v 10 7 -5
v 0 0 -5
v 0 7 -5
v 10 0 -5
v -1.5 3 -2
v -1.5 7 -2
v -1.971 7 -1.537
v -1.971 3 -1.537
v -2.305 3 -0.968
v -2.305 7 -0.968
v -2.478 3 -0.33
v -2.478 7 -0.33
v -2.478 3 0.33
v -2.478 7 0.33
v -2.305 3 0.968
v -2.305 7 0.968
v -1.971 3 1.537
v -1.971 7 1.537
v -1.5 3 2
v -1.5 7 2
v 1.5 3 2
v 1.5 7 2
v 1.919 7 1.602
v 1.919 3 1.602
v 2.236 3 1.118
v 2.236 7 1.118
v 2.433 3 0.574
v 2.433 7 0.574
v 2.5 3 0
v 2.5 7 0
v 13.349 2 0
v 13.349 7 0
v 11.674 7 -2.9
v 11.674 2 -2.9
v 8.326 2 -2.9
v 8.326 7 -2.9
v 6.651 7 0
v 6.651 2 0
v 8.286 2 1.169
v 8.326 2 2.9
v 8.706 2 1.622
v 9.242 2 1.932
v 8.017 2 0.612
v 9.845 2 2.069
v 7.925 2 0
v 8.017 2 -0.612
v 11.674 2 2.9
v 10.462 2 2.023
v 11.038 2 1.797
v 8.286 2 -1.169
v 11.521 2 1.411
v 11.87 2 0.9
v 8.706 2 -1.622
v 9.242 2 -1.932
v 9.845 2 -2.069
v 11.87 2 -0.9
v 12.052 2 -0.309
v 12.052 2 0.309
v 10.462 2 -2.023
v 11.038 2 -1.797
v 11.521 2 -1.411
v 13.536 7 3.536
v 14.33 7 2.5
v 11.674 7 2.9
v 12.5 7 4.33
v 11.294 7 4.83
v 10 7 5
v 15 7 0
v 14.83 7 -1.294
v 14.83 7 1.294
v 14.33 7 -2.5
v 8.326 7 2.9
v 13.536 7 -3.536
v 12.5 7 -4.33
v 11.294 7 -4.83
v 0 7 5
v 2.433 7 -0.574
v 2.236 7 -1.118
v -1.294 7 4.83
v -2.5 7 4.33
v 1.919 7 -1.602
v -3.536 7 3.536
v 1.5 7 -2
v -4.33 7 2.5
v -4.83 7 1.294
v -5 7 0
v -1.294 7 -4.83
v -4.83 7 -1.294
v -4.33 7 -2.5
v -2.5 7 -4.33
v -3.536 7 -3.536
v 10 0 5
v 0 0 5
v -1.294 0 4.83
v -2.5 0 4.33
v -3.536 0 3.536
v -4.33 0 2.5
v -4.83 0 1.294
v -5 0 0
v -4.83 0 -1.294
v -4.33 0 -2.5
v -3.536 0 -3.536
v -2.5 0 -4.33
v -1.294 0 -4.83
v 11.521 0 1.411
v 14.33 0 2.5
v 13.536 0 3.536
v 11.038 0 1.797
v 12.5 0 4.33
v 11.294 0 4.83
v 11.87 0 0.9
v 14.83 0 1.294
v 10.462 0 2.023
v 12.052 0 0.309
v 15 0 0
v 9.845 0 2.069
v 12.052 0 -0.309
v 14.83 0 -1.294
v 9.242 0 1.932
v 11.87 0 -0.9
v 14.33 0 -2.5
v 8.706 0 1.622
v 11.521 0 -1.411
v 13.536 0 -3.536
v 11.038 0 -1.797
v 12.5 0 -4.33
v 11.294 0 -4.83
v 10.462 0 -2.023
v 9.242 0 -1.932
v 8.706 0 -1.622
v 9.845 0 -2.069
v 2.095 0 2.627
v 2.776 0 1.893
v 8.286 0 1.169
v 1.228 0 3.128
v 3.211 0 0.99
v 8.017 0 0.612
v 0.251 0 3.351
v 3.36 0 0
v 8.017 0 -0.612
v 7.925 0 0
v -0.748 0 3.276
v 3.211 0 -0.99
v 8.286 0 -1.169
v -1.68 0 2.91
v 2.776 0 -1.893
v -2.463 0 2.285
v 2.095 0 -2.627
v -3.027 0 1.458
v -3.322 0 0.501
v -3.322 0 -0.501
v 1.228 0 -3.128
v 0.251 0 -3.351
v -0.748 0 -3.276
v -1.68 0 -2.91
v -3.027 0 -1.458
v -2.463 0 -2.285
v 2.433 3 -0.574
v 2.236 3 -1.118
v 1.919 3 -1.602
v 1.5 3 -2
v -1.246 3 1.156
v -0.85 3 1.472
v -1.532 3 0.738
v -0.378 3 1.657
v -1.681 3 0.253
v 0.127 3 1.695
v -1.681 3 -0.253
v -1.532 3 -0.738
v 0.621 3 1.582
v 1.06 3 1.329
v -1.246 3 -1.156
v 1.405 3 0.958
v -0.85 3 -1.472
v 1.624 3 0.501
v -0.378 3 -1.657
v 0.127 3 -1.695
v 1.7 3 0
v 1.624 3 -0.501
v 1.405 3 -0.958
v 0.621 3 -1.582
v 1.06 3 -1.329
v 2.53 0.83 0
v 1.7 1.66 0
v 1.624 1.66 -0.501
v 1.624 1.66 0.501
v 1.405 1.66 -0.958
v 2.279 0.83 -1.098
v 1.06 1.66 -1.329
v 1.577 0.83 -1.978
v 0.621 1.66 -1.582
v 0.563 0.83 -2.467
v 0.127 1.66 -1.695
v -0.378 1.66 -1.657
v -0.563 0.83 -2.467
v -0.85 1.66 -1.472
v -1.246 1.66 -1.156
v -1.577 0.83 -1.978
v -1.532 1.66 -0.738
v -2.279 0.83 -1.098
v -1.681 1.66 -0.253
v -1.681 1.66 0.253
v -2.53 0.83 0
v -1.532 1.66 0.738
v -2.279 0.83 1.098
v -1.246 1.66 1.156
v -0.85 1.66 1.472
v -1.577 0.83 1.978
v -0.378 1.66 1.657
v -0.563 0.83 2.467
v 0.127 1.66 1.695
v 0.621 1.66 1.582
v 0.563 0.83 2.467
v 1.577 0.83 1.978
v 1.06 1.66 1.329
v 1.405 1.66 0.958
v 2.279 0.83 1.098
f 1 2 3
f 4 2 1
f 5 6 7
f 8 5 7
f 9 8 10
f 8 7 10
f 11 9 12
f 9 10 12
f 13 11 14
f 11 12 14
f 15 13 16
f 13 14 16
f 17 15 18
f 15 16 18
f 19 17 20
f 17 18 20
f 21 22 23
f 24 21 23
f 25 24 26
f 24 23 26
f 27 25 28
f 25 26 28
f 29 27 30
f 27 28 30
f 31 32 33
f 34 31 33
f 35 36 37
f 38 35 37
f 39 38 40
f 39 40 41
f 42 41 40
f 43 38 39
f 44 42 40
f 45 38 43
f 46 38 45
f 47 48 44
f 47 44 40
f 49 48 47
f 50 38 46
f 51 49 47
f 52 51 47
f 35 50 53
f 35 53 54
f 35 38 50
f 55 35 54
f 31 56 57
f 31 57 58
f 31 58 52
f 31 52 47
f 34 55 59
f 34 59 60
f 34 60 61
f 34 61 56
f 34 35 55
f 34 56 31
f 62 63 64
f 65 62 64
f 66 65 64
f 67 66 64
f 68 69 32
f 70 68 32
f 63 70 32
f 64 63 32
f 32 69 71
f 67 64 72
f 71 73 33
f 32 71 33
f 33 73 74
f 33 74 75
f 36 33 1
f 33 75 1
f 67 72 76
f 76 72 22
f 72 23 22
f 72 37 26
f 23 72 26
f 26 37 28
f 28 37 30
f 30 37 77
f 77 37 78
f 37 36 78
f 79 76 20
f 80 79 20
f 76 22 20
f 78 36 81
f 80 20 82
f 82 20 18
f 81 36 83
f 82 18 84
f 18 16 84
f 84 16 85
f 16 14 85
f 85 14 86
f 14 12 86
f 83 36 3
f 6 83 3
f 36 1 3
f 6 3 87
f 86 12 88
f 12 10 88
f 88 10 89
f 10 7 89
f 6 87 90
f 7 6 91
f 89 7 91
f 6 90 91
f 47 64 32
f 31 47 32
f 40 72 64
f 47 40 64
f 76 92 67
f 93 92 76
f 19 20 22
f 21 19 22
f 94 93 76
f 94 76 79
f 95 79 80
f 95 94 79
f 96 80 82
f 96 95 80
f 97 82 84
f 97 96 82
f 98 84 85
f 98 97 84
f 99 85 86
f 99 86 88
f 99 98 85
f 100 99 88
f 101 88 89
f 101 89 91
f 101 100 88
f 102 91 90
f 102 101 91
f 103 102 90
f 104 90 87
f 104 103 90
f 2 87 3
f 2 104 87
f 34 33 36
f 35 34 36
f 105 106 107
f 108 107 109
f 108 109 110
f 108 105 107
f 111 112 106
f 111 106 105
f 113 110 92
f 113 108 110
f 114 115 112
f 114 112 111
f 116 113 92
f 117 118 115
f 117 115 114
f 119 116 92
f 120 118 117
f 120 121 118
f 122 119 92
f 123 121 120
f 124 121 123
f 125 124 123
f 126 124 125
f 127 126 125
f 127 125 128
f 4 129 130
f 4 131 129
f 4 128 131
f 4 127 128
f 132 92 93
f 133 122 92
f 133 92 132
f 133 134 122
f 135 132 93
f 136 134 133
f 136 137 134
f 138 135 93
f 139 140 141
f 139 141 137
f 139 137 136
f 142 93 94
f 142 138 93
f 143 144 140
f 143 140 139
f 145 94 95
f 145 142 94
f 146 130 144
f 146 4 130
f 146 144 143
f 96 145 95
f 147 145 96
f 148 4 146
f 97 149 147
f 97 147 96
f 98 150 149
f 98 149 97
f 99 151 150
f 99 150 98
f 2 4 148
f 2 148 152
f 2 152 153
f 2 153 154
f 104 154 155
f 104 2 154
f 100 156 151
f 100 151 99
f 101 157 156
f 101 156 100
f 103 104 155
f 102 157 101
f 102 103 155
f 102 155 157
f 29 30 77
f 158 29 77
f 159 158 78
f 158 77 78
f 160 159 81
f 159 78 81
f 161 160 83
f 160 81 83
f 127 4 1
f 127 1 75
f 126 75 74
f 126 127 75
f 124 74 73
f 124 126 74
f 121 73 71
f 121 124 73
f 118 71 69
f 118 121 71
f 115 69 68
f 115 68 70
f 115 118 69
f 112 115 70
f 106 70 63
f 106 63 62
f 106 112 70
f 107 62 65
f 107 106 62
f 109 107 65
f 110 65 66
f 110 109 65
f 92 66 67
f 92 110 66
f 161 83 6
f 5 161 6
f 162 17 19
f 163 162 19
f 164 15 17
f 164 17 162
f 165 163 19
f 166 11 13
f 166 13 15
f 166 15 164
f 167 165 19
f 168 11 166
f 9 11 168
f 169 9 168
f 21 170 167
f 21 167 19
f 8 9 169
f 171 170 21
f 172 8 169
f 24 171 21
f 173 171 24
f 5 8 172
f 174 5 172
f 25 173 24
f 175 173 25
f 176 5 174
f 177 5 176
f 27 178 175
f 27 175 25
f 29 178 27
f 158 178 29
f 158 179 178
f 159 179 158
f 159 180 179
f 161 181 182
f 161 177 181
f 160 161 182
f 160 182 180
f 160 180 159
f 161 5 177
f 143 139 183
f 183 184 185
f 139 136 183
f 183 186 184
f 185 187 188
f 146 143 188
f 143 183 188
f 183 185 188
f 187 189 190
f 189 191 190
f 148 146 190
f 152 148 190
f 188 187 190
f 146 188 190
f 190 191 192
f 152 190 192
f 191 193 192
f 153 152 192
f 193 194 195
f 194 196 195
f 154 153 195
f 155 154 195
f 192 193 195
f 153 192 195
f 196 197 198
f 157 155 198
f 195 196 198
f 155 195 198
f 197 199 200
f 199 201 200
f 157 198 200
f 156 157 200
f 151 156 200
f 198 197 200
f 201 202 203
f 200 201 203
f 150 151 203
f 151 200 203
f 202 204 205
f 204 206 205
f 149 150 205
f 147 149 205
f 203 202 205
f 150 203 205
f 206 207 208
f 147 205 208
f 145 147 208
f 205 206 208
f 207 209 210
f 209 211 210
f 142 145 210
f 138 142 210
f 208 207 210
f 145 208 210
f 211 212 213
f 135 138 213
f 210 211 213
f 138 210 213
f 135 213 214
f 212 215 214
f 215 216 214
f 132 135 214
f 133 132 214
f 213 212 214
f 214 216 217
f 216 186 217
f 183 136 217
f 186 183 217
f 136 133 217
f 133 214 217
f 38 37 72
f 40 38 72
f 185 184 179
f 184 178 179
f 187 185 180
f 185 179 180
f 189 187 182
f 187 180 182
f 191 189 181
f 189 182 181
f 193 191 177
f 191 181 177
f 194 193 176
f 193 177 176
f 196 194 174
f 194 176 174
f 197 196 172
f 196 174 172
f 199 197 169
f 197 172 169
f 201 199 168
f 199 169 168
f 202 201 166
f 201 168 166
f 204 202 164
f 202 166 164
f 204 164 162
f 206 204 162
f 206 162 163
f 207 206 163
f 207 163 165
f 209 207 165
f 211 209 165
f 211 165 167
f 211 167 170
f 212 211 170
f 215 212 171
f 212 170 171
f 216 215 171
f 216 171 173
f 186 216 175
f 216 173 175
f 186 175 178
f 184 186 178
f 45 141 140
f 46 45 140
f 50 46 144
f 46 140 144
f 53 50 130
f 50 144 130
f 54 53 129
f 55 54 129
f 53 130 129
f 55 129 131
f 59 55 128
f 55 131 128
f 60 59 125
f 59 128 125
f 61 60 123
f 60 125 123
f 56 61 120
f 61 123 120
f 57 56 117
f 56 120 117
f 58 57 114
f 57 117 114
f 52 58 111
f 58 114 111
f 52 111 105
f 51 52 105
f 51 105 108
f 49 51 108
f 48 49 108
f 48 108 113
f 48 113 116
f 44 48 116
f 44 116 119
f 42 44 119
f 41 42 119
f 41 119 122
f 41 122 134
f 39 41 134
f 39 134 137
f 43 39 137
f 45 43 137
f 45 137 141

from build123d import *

# Parameters (mm, degrees)
EXTRUDE_2_DEPTH              = 7
CUT_EXTRUDE_1_DEPTH          = 4
HOLE_WIZARD_M3_1_D           = 3.4
HOLE_WIZARD_M3_1_CSINK_D     = 6.72
HOLE_WIZARD_M3_1_CSINK_ANGLE = 90
HOLE_WIZARD_1_D              = 4.15
HOLE_WIZARD_1_DEPTH          = 10
CUT_EXTRUDE_2_DEPTH          = 5


with BuildPart() as part:
    # 草图1 → 凸台-拉伸2 (new body)
    with BuildSketch(Plane(origin=(0, 0, 0), x_dir=(1, 0, 0), z_dir=(0, 1, 0))):
        with BuildLine():
            Line((0, 5), (10, 5))
            ThreePointArc((10, 5), (15, 0), (10, -5))
            Line((10, -5), (0, -5))
            ThreePointArc((0, -5), (-5, 0), (0, 5))
        make_face()
    extrude(amount=EXTRUDE_2_DEPTH)

    # 草图2 → 切除-拉伸1 (cut)
    with BuildSketch(Plane(origin=(0, 7, 0), x_dir=(1, 0, 0), z_dir=(0, 1, 0))):
        with BuildLine():
            Line((1.5, 2), (-1.5, 2))
            ThreePointArc((-1.5, 2), (-2.5, 0), (-1.5, -2))
            Line((-1.5, -2), (1.5, -2))
            ThreePointArc((1.5, -2), (2.236067977, -1.118033989), (2.5, 0))
            ThreePointArc((2.5, 0), (2.236067977, 1.118033989), (1.5, 2))
        make_face()
    extrude(amount=-CUT_EXTRUDE_1_DEPTH, mode=Mode.SUBTRACT)

    # M3 六角凹锥坑螺钉的锥形沉头孔1 (through all)
    with Locations(Plane(origin=(0, 0, 0), x_dir=(-1, 0, 0), z_dir=(0, -1, 0))):
        with Locations((0, 0)):
            CounterSinkHole(HOLE_WIZARD_M3_1_D / 2, HOLE_WIZARD_M3_1_CSINK_D / 2, counter_sink_angle=HOLE_WIZARD_M3_1_CSINK_ANGLE)

    # 孔1
    with Locations(Plane(origin=(0, 7, 0), x_dir=(1, 0, 0), z_dir=(0, 1, 0))):
        with Locations((10, 0)):
            Hole(HOLE_WIZARD_1_D / 2, depth=HOLE_WIZARD_1_DEPTH)

    # 草图8 → 切除-拉伸2 (cut)
    with BuildSketch(Plane(origin=(0, 7, 0), x_dir=(1, 0, 0), z_dir=(0, 1, 0))):
        Polygon((13.348631561, 0), (11.674315781, 2.9), (8.325684219, 2.9), (6.651368439, 0), (8.325684219, -2.9), (11.674315781, -2.9), align=None)
    extrude(amount=-CUT_EXTRUDE_2_DEPTH, mode=Mode.SUBTRACT)


solid = part.part
